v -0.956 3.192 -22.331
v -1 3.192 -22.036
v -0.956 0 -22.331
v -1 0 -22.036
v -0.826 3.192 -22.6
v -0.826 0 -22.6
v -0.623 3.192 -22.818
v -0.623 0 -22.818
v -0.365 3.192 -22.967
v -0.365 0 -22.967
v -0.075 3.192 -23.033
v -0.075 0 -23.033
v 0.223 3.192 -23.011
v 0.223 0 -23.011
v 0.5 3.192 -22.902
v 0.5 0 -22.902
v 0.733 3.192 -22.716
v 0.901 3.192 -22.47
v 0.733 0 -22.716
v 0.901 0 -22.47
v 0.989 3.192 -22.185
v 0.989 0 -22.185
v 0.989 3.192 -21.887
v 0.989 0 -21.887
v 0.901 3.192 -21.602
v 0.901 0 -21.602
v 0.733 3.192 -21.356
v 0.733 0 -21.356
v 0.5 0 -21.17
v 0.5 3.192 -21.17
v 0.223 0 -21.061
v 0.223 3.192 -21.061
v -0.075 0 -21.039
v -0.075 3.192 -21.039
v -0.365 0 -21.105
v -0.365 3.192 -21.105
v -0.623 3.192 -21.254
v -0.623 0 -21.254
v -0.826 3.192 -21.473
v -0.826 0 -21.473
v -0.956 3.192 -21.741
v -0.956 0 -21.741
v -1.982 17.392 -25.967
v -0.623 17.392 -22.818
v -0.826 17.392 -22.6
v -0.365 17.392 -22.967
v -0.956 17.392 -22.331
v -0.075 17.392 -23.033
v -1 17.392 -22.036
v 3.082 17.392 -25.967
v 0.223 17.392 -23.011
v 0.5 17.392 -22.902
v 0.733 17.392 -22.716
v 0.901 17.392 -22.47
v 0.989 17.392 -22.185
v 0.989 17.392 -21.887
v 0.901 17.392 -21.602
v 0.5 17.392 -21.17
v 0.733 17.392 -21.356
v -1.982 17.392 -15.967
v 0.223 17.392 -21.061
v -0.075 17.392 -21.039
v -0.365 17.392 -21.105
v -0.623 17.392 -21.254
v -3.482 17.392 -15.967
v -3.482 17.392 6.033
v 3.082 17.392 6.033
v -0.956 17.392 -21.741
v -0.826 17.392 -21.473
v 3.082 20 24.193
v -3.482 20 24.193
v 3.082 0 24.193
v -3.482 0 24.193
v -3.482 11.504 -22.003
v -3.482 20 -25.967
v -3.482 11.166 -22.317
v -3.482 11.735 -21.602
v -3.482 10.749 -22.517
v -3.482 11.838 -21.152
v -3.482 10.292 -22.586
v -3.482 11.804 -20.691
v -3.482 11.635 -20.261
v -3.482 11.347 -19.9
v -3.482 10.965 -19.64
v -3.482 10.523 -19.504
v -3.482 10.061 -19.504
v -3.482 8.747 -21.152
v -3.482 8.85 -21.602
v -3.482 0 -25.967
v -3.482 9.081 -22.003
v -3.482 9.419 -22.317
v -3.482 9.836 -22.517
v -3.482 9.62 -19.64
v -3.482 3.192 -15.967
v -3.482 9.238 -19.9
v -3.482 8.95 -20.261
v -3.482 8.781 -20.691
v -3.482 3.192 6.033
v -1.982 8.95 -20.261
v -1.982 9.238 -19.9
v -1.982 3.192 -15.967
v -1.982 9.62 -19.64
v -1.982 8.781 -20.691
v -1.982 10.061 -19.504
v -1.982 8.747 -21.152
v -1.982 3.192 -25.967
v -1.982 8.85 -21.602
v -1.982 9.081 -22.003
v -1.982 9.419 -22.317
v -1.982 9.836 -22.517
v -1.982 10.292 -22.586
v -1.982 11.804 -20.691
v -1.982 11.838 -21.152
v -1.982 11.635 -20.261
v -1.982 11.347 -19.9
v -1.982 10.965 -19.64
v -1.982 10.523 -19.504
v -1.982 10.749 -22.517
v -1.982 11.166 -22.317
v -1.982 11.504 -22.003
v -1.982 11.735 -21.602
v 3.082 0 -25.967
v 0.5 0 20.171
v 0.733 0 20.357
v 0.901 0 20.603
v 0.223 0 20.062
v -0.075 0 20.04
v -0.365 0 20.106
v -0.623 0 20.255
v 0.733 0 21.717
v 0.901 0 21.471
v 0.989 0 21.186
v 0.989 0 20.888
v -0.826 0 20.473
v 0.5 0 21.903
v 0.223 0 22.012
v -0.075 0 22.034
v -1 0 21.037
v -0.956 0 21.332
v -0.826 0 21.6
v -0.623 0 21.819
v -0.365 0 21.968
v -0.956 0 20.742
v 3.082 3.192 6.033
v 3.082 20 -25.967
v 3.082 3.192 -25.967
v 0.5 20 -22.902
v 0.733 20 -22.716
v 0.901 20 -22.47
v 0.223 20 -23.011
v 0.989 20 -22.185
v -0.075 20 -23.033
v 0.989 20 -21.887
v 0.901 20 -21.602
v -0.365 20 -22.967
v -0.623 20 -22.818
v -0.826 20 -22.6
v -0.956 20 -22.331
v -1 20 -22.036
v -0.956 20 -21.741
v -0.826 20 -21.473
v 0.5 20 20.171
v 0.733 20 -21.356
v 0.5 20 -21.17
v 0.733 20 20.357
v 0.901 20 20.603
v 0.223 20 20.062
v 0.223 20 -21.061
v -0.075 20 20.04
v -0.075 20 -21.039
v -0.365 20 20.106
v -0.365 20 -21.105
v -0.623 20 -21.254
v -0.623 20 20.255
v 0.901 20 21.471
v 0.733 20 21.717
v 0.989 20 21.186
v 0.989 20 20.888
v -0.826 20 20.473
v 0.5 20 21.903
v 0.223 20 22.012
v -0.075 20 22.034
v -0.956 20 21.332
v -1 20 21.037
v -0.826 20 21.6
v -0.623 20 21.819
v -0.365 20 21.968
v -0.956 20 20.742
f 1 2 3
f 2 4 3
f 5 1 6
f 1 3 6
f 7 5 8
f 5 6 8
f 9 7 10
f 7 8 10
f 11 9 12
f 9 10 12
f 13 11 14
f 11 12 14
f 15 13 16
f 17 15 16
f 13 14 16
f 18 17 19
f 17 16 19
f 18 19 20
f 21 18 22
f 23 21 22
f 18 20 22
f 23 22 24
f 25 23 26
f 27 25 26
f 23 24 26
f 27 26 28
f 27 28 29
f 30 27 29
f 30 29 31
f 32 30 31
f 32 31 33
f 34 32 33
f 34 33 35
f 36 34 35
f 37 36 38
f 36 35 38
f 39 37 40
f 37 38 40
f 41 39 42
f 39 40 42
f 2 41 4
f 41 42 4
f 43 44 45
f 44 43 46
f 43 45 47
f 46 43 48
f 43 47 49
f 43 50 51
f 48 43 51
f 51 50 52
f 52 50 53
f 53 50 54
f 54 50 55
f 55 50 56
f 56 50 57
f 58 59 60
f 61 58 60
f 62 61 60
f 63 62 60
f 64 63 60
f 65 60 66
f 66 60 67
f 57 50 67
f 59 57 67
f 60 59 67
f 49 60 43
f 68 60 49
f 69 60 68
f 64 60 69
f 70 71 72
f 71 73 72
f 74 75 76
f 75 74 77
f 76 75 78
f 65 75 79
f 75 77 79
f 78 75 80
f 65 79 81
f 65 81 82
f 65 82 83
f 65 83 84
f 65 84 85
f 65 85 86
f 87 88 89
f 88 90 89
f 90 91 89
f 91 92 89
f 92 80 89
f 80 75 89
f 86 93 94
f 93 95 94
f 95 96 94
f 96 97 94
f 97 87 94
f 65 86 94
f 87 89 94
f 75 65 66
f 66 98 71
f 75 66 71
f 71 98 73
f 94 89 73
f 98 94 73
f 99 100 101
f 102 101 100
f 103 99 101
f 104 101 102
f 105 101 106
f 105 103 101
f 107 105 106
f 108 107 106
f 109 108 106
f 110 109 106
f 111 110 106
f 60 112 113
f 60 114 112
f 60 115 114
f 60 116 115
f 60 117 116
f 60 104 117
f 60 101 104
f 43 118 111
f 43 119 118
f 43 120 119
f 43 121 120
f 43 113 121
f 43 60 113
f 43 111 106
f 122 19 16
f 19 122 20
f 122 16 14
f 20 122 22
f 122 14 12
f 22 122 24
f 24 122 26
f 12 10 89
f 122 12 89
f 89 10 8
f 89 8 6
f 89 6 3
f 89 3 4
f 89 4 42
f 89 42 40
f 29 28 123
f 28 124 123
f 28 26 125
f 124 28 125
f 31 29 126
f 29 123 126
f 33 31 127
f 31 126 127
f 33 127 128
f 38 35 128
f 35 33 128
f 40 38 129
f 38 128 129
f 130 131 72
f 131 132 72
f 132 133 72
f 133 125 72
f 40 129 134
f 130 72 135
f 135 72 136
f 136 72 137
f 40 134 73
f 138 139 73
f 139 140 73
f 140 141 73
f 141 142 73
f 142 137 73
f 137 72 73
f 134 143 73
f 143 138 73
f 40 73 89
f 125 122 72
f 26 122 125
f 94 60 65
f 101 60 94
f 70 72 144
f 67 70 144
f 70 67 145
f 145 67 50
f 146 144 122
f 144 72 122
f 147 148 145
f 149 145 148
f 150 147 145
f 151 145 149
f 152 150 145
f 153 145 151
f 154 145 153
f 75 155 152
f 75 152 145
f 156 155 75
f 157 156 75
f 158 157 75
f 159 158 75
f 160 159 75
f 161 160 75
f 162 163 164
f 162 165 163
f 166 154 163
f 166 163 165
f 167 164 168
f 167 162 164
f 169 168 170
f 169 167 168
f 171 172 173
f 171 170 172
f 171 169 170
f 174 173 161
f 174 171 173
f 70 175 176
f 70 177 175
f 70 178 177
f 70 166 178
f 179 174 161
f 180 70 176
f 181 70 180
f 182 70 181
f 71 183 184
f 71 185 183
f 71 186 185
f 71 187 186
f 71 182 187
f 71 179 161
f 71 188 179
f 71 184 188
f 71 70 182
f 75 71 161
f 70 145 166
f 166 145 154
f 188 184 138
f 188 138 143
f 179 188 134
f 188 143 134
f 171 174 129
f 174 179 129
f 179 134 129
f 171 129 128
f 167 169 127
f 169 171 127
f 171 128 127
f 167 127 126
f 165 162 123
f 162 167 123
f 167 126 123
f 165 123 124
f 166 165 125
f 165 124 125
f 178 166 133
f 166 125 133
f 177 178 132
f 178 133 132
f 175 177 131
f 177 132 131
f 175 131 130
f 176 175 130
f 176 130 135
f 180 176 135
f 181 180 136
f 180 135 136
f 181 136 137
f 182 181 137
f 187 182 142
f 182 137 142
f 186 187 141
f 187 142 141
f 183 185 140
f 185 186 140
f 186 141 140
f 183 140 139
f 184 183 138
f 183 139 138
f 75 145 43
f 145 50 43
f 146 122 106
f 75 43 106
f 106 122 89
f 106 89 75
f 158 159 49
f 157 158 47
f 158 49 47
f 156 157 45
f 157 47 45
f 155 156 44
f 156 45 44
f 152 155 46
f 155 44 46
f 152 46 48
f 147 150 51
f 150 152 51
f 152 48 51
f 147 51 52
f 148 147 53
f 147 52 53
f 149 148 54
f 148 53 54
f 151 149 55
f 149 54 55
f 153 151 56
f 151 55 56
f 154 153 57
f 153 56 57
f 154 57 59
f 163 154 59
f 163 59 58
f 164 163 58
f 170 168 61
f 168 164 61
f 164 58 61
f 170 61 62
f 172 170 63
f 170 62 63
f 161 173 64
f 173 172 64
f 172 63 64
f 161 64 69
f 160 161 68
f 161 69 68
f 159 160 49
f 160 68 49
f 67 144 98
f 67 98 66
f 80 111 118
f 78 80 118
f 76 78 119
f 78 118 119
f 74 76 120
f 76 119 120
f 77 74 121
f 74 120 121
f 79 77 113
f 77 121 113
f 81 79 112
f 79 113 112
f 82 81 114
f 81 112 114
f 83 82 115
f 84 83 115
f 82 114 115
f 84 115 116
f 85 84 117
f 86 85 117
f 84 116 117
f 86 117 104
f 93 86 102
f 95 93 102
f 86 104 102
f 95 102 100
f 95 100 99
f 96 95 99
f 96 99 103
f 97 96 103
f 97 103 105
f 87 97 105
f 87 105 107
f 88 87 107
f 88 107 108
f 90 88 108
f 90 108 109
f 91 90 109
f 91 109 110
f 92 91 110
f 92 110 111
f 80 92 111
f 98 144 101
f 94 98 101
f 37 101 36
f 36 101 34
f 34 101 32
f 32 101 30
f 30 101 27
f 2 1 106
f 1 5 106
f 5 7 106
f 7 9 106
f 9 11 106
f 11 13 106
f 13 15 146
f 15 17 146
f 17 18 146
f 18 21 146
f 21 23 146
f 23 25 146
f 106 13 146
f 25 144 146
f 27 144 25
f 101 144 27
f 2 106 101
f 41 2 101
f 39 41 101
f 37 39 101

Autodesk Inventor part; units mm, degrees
ref_plane "YZ Plane" through (0, 0, 0) normal (1, 0, 0) x (0, 1, 0)
ref_plane "XZ Plane" through (0, 0, 0) normal (0, 1, 0) x (-1, 0, 0)
ref_plane "XY Plane" through (0, 0, 0) normal (0, 0, 1) x (1, 0, 0)
sketch "Эскиз1" plane through (0, 0, 0) normal (0, 1, 0) x (-1, 0, 0)
  circle A0 centre (0, 21.0368) radius 1
  circle A1 centre (0, -22.0362) radius 1
  line L0 (3.4815, 24.1933) -> (-3.0824, 24.1933)
  line L1 (-3.0824, 24.1933) -> (-3.0824, -25.9673)
  line L2 (-3.0824, -25.9673) -> (3.4815, -25.9673)
  line L3 (3.4815, -25.9673) -> (3.4815, 24.1933)
  point P0 (0, 0)
  dimension "d0" = 43.073
  dimension "d1" = 2
  dimension "d2" = 2
extrude "Выдавливание1" add sketch "Эскиз1" along normal blind 20
sketch "Эскиз2" plane through (3.0824, 0, 24.1933) normal (1, 0, 0) x (0, 0, -1)
  line L0 (50.1606, 0) -> (50.1606, 20) projected
  line L1 (0, 0) -> (0, 20) projected
  line L2 (50.1606, 17.3924) -> (0, 17.3924)
  line L3 (0, 17.3924) -> (0, 3.1924)
  line L4 (0, 3.1924) -> (50.1606, 3.1924)
  line L5 (50.1606, 3.1924) -> (50.1606, 17.3924)
  line L6 (18.1606, 3.1924) -> (18.1606, 17.3924)
  line L7 (40.1606, 17.3924) -> (40.1606, 3.1924)
  line L8 (45.2295, 20) -> (45.2295, 0) projected
  circle A0 centre (45.2295, 10.2924) radius 1.55
  point P0 (24.1933, 0)
  point P1 (50.1606, 10)
  dimension "d5" = 14.2
  dimension "d6" = 32
  dimension "d7" = 10
  dimension "d8" = 3.1
extrude "Выдавливание2" cut sketch "Эскиз2" against normal through all contours L4 L6 L2 L7 | A0 L8 | L8 A0
extrude "Выдавливание3" cut sketch "Эскиз2" against normal blind 5.064 contours L4 L8 A0 L2 L0 | L4 L7 L2 L8 A0
properties part number "tcrt_to_mgn7"
